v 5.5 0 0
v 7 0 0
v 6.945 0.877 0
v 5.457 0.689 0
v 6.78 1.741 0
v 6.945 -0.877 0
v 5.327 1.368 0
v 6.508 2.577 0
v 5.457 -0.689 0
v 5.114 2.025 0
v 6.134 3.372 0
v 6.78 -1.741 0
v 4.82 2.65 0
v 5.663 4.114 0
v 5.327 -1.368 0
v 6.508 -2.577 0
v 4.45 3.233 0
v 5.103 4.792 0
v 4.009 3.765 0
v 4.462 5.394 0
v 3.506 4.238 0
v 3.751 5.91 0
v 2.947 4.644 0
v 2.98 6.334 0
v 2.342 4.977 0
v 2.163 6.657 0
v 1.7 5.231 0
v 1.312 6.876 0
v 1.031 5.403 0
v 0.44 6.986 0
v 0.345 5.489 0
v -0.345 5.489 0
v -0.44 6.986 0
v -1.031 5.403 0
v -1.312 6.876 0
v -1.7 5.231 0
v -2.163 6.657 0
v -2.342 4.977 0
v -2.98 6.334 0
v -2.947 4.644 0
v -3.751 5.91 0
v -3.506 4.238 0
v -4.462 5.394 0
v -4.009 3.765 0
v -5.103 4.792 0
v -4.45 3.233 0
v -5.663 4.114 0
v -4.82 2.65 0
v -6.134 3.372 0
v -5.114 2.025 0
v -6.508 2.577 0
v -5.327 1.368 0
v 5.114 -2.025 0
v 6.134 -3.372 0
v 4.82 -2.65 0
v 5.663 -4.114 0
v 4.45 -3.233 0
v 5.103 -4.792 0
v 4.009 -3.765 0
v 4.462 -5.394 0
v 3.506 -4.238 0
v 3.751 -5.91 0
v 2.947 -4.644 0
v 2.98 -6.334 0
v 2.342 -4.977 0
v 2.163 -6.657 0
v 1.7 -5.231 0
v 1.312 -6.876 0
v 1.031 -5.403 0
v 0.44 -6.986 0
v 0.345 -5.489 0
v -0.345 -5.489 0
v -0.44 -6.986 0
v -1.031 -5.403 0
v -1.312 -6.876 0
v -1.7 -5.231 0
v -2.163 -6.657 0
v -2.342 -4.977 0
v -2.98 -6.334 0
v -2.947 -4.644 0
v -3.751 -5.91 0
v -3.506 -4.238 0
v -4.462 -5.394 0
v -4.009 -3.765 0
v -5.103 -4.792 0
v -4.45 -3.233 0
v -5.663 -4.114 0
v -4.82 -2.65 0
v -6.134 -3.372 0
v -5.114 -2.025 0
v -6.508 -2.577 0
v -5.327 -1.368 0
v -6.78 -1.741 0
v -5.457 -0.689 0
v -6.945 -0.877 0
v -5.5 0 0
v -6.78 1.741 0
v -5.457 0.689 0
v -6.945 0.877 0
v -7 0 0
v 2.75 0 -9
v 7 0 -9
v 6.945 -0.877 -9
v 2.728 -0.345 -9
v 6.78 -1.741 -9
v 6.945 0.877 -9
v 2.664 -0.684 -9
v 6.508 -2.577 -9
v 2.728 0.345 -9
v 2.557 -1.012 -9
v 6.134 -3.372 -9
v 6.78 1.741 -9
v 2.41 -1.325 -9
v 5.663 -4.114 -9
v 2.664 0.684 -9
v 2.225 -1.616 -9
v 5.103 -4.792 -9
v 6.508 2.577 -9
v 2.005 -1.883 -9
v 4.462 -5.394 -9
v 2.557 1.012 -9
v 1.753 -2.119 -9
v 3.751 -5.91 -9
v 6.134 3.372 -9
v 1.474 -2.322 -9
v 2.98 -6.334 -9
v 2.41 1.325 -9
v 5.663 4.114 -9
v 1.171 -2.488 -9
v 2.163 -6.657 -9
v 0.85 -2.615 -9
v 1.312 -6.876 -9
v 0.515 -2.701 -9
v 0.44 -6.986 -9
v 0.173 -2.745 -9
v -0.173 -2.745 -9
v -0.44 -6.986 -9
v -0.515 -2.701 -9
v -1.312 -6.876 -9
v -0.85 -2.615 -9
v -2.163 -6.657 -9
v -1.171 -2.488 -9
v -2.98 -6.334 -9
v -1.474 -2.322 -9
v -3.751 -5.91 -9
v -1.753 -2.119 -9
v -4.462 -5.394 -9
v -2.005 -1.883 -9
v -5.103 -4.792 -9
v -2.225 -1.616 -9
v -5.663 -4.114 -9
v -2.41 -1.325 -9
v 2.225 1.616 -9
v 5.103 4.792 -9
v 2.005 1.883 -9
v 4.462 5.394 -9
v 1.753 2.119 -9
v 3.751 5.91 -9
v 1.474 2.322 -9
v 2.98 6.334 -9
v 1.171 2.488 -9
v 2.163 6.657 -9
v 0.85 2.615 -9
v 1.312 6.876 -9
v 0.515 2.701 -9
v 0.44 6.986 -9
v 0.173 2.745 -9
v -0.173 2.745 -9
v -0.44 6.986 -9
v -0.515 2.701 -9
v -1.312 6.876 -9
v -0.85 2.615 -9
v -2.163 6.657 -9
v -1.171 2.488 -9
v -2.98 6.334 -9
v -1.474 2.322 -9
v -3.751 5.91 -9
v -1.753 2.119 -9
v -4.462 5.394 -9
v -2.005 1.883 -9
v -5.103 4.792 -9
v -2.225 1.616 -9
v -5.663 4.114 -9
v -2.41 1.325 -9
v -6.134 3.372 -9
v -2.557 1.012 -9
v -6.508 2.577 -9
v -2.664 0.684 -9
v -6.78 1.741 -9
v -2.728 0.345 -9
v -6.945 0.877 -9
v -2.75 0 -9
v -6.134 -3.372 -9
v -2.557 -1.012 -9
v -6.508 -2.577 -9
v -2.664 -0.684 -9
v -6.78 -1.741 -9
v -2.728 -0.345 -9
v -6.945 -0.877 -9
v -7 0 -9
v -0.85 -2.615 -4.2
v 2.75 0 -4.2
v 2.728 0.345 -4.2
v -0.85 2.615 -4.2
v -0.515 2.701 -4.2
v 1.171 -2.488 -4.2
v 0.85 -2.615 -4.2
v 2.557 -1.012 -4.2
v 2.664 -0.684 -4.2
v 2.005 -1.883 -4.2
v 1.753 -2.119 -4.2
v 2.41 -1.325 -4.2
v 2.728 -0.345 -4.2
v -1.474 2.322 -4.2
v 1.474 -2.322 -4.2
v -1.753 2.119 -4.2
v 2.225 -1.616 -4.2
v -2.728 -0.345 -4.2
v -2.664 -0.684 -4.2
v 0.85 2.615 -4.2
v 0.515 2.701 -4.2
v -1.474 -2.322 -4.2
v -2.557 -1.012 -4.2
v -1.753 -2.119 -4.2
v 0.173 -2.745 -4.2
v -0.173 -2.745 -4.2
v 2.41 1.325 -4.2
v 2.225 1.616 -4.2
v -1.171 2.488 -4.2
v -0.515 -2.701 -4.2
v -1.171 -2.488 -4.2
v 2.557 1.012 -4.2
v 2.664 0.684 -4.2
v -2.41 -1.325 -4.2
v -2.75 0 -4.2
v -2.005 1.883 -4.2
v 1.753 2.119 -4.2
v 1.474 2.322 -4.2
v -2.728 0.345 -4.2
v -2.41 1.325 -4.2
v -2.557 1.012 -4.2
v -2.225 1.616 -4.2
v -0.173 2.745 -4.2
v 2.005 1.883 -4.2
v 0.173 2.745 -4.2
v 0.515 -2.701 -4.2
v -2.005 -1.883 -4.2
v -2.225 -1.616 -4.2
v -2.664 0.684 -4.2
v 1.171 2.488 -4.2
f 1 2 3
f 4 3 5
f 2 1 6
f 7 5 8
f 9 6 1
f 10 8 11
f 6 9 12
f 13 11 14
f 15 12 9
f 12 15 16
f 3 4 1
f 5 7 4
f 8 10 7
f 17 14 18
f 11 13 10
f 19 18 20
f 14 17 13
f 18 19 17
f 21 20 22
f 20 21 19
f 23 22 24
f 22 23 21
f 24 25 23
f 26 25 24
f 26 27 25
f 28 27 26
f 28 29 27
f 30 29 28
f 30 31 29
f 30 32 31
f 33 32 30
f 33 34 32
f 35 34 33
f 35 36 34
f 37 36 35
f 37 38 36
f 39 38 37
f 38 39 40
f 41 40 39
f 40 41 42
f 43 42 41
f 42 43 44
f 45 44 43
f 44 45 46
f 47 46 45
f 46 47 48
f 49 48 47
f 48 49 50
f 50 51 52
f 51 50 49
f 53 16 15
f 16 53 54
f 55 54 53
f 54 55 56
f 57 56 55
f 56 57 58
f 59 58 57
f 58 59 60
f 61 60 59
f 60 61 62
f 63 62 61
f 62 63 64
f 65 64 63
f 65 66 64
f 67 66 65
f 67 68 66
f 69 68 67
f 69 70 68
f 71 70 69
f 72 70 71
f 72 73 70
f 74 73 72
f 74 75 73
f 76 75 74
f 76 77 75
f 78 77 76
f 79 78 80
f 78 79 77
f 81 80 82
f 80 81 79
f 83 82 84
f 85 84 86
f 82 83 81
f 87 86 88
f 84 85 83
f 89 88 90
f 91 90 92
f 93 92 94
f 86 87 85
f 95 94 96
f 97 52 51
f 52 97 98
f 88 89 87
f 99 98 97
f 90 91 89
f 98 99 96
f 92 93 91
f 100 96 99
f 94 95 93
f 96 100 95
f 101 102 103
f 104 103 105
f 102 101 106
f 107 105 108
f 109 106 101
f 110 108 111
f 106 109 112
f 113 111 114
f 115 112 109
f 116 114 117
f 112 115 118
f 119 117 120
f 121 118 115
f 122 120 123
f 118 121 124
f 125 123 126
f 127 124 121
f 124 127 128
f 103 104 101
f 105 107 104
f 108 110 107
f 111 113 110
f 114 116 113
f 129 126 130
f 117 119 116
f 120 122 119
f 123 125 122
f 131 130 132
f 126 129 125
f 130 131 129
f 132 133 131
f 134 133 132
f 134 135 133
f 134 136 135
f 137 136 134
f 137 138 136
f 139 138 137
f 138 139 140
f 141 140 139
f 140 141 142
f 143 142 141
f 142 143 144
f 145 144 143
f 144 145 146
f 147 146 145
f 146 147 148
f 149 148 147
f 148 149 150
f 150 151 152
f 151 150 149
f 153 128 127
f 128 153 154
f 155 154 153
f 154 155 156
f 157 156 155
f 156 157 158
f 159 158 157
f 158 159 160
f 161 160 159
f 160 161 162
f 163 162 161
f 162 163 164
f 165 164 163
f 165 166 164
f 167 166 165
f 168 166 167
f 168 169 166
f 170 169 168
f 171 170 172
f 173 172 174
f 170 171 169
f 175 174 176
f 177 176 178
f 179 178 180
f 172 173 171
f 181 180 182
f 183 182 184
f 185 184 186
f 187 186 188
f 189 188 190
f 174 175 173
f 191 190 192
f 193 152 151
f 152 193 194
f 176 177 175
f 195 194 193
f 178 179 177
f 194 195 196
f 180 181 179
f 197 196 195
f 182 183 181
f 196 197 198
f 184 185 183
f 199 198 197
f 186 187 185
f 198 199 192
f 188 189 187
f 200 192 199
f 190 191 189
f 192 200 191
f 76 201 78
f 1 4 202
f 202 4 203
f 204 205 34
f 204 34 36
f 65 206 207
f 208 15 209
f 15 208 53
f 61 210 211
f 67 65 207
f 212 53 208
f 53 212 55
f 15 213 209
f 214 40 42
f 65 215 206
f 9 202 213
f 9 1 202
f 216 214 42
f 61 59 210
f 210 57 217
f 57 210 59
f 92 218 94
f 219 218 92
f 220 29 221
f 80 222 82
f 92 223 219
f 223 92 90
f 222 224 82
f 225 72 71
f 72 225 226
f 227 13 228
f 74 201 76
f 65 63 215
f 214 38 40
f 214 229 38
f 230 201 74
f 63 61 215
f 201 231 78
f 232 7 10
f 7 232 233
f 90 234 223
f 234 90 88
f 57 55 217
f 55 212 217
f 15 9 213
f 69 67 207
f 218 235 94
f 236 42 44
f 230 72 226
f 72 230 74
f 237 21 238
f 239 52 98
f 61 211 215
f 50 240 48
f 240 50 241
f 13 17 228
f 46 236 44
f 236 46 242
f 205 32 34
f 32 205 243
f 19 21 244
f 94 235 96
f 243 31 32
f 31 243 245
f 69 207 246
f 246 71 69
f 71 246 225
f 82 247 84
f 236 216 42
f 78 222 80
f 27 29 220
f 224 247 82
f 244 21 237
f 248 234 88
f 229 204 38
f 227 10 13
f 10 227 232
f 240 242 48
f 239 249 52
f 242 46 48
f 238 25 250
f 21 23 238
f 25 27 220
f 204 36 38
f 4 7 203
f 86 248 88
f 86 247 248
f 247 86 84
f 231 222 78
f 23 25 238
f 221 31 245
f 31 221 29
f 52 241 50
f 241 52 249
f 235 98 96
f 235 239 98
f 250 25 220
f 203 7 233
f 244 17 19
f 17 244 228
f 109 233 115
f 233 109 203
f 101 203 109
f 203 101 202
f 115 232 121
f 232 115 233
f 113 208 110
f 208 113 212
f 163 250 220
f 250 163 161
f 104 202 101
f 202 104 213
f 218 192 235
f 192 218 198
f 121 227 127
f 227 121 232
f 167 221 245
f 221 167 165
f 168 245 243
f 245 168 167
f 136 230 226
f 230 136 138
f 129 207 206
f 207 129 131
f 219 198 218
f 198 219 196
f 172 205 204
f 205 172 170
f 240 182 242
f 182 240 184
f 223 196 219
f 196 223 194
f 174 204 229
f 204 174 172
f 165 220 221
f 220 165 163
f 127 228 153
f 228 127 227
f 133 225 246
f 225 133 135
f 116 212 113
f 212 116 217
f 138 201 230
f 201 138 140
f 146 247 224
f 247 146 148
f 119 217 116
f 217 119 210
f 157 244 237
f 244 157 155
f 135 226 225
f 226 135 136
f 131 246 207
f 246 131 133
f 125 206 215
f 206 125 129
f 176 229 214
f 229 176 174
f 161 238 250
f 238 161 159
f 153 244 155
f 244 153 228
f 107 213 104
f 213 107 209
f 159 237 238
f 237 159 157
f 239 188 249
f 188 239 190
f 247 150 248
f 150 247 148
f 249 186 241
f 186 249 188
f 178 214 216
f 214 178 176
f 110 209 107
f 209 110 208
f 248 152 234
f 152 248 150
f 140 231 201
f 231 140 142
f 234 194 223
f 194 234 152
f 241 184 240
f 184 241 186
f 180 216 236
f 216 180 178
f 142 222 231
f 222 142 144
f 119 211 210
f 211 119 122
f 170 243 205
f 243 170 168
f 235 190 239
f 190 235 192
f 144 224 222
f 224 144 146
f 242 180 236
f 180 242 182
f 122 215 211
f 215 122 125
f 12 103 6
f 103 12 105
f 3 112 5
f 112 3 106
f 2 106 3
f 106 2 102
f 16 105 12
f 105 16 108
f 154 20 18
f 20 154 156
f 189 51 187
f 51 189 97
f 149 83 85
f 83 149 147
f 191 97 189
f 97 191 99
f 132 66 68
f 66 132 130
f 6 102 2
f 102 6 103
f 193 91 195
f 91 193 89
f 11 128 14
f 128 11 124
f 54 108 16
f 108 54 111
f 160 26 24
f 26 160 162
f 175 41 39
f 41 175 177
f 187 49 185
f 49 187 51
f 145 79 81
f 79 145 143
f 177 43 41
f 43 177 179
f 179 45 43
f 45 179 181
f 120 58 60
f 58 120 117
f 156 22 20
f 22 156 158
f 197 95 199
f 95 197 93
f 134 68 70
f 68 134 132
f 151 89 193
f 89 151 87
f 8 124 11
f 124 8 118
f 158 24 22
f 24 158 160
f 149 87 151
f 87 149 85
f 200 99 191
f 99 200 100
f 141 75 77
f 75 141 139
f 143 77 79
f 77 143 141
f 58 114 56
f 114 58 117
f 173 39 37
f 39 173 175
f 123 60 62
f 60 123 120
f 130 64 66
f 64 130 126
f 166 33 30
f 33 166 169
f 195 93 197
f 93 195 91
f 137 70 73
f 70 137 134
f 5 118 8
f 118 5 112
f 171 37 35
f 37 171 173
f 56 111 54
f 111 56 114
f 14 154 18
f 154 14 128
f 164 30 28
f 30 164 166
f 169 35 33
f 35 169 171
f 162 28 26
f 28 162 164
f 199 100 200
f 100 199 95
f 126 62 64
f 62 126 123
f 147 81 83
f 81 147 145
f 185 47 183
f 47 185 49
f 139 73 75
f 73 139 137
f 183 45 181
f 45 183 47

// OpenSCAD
$fn = 50;


difference() {
	union() {
		translate(v = [0, 0, -9.0000000000]) {
			cylinder(h = 9, r = 7.0000000000);
		}
	}
	union() {
		translate(v = [0, 0, 0]) {
			rotate(a = [0, 0, 0]) {
				difference() {
					union() {
						#translate(v = [0, 0, -9.0000000000]) {
							cylinder(h = 9, r = 2.2500000000);
						}
						#translate(v = [0, 0, -4.2000000000]) {
							cylinder(h = 4.2000000000, r1 = 2.7500000000, r2 = 5.5000000000);
						}
						#translate(v = [0, 0, -9.0000000000]) {
							cylinder(h = 9, r = 2.7500000000);
						}
						#translate(v = [0, 0, -9.0000000000]) {
							cylinder(h = 9, r = 2.2500000000);
						}
					}
					union();
				}
			}
		}
	}
}
